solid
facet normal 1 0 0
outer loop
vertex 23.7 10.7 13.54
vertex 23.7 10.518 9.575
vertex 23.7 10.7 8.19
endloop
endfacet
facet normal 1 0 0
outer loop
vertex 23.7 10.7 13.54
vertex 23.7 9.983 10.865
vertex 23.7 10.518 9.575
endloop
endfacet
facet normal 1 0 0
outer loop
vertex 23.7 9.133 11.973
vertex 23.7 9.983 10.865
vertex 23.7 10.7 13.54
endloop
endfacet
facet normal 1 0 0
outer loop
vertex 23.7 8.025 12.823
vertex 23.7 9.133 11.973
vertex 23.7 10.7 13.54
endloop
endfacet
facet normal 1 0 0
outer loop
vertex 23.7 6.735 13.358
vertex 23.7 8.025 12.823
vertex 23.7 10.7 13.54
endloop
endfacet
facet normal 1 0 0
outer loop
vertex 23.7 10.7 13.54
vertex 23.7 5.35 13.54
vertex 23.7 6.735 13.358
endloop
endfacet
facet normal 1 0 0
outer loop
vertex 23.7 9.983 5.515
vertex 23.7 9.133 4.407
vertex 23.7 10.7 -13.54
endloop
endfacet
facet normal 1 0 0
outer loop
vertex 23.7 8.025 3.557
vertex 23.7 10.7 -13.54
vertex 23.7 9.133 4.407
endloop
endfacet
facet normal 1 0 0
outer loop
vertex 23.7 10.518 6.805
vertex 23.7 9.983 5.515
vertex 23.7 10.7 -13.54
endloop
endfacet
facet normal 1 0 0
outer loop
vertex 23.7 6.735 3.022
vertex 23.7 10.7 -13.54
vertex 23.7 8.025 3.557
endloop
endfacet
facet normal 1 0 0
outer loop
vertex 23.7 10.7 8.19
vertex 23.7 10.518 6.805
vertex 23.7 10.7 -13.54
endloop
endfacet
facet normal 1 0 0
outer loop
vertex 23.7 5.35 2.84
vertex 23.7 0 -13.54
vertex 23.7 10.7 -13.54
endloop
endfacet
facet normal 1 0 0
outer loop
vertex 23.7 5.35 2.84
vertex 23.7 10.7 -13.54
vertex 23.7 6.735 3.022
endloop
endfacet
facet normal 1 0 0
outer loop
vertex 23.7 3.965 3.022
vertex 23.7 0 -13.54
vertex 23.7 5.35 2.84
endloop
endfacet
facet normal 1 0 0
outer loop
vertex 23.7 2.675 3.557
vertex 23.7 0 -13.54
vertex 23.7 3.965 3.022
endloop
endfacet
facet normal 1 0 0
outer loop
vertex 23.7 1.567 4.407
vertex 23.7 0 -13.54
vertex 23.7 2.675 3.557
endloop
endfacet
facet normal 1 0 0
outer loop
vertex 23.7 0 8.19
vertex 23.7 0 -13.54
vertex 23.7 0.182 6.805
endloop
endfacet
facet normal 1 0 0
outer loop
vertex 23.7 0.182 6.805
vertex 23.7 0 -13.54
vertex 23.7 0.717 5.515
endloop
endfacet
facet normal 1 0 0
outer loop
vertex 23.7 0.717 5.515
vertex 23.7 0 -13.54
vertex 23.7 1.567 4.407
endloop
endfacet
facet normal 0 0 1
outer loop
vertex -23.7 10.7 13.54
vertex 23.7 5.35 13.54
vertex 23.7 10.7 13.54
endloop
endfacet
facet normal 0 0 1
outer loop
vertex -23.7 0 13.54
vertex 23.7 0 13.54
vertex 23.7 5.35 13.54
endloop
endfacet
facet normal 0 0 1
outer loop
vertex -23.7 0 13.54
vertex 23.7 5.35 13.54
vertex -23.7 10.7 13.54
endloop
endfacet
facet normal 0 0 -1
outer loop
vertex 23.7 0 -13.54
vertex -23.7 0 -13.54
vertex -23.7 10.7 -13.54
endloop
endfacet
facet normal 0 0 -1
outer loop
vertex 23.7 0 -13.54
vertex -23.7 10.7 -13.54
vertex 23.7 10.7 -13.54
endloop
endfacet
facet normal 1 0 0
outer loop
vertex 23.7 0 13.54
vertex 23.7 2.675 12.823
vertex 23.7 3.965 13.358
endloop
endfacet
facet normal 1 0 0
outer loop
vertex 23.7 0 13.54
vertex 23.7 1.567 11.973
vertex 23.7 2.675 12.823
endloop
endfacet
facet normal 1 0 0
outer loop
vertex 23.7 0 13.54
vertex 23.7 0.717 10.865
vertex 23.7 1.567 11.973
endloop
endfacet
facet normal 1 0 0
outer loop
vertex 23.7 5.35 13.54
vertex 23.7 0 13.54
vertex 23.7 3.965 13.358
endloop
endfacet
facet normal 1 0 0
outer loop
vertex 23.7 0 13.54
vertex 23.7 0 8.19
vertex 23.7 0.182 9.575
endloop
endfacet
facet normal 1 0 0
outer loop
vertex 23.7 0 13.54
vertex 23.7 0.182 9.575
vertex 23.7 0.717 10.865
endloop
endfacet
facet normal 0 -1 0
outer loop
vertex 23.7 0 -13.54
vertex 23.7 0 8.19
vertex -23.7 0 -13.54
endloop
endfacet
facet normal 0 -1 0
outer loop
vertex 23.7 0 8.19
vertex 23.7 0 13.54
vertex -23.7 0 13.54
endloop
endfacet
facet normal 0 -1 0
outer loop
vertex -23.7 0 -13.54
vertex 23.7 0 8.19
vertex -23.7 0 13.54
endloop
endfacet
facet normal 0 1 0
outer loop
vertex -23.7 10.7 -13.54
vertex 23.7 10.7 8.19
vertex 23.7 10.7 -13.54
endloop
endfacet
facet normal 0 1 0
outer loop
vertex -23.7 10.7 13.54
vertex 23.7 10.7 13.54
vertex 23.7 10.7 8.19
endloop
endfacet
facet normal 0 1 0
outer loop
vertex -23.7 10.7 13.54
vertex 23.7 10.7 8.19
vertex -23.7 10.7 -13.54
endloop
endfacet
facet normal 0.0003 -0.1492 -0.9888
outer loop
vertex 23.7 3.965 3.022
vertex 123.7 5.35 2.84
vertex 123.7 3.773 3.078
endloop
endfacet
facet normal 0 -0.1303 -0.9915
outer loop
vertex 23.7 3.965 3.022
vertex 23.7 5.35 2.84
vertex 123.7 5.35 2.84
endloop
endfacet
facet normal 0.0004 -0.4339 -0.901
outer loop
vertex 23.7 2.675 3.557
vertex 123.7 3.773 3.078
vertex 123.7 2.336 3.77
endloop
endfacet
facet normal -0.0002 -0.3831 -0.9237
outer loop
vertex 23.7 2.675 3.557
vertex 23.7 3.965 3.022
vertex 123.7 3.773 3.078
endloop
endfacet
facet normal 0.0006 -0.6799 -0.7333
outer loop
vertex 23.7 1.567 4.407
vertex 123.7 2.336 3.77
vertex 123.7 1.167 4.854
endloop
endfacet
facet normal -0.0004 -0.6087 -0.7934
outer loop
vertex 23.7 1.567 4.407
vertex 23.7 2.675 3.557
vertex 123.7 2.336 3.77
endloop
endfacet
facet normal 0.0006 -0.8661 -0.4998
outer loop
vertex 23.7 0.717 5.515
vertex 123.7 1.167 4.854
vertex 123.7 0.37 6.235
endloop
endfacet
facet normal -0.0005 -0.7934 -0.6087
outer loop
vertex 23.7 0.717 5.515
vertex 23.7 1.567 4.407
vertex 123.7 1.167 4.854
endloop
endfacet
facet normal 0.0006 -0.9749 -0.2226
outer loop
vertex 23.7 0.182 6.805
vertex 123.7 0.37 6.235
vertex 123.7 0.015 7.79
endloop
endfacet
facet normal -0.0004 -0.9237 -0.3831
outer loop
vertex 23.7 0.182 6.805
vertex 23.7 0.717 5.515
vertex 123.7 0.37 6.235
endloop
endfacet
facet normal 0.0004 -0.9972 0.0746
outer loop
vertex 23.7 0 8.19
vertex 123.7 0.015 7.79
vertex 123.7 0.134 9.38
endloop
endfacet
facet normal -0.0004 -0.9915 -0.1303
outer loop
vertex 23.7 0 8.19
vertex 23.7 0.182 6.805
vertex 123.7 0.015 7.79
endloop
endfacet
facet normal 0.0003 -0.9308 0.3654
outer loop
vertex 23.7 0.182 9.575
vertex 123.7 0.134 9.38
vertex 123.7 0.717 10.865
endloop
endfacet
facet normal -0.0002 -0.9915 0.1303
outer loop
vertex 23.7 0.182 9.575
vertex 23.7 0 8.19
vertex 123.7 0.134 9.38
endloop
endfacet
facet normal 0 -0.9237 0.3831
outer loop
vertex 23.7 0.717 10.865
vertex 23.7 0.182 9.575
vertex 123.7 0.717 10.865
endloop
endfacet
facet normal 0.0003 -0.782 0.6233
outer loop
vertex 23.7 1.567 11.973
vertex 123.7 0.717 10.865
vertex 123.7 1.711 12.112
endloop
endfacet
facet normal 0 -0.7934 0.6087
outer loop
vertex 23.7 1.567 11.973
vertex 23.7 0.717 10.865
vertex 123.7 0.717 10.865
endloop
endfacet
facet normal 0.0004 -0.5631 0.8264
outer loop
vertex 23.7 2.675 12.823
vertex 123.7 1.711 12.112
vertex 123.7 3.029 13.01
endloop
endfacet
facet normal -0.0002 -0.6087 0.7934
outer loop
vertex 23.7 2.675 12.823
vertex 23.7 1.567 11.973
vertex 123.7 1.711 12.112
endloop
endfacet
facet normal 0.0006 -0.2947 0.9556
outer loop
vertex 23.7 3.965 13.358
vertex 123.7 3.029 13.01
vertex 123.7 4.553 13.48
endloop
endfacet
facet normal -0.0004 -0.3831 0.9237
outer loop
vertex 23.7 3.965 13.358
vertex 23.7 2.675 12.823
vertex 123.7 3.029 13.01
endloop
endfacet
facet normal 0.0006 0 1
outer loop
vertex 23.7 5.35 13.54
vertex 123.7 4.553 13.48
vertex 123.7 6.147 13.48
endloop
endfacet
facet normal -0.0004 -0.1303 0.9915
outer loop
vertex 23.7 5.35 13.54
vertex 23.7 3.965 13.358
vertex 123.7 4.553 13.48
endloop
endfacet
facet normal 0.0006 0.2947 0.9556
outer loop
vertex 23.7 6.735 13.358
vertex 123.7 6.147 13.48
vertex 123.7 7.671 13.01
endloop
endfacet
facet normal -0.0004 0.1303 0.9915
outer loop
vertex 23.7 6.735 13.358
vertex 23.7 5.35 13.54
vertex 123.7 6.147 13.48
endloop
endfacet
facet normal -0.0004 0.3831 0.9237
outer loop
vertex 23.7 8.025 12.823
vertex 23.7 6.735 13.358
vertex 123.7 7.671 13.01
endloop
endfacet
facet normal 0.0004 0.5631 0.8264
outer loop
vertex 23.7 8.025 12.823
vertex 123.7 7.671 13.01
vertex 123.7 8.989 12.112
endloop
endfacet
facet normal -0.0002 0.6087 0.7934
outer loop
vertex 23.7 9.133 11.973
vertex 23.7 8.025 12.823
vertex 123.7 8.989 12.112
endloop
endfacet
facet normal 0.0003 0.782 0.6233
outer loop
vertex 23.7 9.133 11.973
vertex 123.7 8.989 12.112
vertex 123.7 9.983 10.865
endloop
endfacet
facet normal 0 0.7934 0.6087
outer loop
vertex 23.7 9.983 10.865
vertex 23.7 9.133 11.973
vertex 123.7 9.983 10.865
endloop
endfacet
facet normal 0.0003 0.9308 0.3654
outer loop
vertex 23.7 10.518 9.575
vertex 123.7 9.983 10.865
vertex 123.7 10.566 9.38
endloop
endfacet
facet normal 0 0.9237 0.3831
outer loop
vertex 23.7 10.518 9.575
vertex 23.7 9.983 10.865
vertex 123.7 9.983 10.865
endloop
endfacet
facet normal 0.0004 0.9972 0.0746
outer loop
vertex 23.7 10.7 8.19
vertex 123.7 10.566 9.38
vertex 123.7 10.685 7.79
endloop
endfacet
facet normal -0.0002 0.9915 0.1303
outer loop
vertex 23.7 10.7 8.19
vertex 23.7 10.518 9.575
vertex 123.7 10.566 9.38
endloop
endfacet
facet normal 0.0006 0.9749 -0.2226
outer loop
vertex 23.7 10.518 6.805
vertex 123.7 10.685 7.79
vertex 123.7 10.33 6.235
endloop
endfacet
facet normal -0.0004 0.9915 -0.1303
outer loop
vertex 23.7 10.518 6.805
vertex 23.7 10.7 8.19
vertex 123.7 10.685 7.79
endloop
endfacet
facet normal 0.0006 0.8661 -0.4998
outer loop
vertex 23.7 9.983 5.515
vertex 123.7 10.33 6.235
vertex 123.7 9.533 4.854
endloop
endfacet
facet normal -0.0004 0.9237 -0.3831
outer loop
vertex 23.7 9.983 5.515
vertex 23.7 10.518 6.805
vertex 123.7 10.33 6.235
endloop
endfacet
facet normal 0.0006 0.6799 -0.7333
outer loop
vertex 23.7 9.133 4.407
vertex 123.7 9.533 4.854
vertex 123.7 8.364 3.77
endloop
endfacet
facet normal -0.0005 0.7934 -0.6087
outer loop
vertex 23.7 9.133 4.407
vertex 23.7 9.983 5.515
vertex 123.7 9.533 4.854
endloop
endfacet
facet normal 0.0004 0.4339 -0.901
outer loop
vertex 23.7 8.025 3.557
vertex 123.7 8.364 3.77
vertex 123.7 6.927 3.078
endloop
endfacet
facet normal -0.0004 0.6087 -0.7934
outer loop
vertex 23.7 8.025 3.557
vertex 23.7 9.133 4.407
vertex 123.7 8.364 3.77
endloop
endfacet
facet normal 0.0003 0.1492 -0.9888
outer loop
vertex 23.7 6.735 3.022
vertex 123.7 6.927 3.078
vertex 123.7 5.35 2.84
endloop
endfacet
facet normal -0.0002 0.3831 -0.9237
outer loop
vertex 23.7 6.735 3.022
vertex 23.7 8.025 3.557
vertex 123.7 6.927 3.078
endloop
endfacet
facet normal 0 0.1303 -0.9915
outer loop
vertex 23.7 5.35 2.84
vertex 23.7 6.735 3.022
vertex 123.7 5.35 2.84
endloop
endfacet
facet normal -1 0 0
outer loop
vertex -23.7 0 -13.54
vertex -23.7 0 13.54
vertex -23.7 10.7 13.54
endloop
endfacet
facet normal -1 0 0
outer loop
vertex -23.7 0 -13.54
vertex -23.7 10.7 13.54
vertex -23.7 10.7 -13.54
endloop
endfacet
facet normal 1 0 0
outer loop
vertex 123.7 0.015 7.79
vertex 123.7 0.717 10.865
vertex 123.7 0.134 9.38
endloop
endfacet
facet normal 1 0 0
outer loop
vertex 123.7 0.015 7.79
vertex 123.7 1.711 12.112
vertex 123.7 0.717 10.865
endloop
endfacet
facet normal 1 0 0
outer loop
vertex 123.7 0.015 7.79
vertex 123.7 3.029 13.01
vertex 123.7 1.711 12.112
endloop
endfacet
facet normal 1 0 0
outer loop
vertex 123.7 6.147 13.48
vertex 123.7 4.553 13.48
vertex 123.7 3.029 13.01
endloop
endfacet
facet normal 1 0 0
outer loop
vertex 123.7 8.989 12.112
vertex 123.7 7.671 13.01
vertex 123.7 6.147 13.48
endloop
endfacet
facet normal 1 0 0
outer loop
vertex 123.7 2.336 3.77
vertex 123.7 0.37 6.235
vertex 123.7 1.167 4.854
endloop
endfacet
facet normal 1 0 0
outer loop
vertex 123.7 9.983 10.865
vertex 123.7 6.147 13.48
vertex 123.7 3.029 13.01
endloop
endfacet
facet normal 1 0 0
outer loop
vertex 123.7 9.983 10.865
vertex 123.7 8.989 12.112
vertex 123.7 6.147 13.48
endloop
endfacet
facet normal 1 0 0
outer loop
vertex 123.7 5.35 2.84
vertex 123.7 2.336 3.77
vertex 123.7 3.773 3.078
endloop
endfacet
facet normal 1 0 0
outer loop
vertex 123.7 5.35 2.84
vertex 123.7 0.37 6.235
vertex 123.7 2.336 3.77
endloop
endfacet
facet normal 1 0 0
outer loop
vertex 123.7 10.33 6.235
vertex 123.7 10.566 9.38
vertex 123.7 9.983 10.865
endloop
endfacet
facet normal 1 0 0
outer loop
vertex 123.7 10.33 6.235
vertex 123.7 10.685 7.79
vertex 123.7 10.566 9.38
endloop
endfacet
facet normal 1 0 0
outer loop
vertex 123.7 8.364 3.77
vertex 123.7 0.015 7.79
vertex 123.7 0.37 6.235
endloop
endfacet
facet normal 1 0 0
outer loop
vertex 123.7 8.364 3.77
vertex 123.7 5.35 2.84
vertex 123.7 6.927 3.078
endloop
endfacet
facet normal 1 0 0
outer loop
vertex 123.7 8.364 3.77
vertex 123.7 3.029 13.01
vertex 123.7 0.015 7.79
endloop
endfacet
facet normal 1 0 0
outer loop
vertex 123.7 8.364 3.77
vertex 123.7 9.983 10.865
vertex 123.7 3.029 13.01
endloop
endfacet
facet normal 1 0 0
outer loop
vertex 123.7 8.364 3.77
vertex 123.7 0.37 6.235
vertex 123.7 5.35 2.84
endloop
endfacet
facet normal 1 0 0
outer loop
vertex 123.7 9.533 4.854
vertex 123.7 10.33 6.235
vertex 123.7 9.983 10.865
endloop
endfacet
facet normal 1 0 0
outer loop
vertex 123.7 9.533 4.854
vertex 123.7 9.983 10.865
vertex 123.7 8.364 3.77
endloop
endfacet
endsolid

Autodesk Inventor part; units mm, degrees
ref_plane "YZ Plane" through (0, 0, 0) normal (1, 0, 0) x (0, 1, 0)
ref_plane "XZ Plane" through (0, 0, 0) normal (0, 1, 0) x (-1, 0, 0)
ref_plane "XY Plane" through (0, 0, 0) normal (0, 0, 1) x (1, 0, 0)
sketch "草圖1" plane through (0, 0, 0) normal (0, 1, 0) x (-1, 0, 0)
  line L0 (-23.7, 13.54) -> (23.7, 13.54)
  line L1 (23.7, 13.54) -> (23.7, -13.54)
  line L2 (23.7, -13.54) -> (-23.7, -13.54)
  line L3 (-23.7, -13.54) -> (-23.7, 13.54)
  line L4 (-23.7, 13.54) -> (23.7, -13.54) construction
  line L5 (23.7, 13.54) -> (-23.7, -13.54) construction
  point P0 (0, 0)
  dimension "d0" = 47.4
  dimension "d1" = 27.08
extrude "擠出1" add sketch "草圖1" along normal blind 10.7
sketch "草圖2" plane through (23.7, 0, 13.54) normal (1, 0, 0) x (0, 0, -1)
  circle A0 centre (5.35, 5.35) radius 5.35
  line L0 (27.08, 10.7) -> (0, 10.7) projected
  line L1 (0, 0) -> (0, 10.7) projected
  point P0 (13.54, 0)
extrude "擠出2" add sketch "草圖2" along normal blind 100 contours A0
properties part number "telementry"
